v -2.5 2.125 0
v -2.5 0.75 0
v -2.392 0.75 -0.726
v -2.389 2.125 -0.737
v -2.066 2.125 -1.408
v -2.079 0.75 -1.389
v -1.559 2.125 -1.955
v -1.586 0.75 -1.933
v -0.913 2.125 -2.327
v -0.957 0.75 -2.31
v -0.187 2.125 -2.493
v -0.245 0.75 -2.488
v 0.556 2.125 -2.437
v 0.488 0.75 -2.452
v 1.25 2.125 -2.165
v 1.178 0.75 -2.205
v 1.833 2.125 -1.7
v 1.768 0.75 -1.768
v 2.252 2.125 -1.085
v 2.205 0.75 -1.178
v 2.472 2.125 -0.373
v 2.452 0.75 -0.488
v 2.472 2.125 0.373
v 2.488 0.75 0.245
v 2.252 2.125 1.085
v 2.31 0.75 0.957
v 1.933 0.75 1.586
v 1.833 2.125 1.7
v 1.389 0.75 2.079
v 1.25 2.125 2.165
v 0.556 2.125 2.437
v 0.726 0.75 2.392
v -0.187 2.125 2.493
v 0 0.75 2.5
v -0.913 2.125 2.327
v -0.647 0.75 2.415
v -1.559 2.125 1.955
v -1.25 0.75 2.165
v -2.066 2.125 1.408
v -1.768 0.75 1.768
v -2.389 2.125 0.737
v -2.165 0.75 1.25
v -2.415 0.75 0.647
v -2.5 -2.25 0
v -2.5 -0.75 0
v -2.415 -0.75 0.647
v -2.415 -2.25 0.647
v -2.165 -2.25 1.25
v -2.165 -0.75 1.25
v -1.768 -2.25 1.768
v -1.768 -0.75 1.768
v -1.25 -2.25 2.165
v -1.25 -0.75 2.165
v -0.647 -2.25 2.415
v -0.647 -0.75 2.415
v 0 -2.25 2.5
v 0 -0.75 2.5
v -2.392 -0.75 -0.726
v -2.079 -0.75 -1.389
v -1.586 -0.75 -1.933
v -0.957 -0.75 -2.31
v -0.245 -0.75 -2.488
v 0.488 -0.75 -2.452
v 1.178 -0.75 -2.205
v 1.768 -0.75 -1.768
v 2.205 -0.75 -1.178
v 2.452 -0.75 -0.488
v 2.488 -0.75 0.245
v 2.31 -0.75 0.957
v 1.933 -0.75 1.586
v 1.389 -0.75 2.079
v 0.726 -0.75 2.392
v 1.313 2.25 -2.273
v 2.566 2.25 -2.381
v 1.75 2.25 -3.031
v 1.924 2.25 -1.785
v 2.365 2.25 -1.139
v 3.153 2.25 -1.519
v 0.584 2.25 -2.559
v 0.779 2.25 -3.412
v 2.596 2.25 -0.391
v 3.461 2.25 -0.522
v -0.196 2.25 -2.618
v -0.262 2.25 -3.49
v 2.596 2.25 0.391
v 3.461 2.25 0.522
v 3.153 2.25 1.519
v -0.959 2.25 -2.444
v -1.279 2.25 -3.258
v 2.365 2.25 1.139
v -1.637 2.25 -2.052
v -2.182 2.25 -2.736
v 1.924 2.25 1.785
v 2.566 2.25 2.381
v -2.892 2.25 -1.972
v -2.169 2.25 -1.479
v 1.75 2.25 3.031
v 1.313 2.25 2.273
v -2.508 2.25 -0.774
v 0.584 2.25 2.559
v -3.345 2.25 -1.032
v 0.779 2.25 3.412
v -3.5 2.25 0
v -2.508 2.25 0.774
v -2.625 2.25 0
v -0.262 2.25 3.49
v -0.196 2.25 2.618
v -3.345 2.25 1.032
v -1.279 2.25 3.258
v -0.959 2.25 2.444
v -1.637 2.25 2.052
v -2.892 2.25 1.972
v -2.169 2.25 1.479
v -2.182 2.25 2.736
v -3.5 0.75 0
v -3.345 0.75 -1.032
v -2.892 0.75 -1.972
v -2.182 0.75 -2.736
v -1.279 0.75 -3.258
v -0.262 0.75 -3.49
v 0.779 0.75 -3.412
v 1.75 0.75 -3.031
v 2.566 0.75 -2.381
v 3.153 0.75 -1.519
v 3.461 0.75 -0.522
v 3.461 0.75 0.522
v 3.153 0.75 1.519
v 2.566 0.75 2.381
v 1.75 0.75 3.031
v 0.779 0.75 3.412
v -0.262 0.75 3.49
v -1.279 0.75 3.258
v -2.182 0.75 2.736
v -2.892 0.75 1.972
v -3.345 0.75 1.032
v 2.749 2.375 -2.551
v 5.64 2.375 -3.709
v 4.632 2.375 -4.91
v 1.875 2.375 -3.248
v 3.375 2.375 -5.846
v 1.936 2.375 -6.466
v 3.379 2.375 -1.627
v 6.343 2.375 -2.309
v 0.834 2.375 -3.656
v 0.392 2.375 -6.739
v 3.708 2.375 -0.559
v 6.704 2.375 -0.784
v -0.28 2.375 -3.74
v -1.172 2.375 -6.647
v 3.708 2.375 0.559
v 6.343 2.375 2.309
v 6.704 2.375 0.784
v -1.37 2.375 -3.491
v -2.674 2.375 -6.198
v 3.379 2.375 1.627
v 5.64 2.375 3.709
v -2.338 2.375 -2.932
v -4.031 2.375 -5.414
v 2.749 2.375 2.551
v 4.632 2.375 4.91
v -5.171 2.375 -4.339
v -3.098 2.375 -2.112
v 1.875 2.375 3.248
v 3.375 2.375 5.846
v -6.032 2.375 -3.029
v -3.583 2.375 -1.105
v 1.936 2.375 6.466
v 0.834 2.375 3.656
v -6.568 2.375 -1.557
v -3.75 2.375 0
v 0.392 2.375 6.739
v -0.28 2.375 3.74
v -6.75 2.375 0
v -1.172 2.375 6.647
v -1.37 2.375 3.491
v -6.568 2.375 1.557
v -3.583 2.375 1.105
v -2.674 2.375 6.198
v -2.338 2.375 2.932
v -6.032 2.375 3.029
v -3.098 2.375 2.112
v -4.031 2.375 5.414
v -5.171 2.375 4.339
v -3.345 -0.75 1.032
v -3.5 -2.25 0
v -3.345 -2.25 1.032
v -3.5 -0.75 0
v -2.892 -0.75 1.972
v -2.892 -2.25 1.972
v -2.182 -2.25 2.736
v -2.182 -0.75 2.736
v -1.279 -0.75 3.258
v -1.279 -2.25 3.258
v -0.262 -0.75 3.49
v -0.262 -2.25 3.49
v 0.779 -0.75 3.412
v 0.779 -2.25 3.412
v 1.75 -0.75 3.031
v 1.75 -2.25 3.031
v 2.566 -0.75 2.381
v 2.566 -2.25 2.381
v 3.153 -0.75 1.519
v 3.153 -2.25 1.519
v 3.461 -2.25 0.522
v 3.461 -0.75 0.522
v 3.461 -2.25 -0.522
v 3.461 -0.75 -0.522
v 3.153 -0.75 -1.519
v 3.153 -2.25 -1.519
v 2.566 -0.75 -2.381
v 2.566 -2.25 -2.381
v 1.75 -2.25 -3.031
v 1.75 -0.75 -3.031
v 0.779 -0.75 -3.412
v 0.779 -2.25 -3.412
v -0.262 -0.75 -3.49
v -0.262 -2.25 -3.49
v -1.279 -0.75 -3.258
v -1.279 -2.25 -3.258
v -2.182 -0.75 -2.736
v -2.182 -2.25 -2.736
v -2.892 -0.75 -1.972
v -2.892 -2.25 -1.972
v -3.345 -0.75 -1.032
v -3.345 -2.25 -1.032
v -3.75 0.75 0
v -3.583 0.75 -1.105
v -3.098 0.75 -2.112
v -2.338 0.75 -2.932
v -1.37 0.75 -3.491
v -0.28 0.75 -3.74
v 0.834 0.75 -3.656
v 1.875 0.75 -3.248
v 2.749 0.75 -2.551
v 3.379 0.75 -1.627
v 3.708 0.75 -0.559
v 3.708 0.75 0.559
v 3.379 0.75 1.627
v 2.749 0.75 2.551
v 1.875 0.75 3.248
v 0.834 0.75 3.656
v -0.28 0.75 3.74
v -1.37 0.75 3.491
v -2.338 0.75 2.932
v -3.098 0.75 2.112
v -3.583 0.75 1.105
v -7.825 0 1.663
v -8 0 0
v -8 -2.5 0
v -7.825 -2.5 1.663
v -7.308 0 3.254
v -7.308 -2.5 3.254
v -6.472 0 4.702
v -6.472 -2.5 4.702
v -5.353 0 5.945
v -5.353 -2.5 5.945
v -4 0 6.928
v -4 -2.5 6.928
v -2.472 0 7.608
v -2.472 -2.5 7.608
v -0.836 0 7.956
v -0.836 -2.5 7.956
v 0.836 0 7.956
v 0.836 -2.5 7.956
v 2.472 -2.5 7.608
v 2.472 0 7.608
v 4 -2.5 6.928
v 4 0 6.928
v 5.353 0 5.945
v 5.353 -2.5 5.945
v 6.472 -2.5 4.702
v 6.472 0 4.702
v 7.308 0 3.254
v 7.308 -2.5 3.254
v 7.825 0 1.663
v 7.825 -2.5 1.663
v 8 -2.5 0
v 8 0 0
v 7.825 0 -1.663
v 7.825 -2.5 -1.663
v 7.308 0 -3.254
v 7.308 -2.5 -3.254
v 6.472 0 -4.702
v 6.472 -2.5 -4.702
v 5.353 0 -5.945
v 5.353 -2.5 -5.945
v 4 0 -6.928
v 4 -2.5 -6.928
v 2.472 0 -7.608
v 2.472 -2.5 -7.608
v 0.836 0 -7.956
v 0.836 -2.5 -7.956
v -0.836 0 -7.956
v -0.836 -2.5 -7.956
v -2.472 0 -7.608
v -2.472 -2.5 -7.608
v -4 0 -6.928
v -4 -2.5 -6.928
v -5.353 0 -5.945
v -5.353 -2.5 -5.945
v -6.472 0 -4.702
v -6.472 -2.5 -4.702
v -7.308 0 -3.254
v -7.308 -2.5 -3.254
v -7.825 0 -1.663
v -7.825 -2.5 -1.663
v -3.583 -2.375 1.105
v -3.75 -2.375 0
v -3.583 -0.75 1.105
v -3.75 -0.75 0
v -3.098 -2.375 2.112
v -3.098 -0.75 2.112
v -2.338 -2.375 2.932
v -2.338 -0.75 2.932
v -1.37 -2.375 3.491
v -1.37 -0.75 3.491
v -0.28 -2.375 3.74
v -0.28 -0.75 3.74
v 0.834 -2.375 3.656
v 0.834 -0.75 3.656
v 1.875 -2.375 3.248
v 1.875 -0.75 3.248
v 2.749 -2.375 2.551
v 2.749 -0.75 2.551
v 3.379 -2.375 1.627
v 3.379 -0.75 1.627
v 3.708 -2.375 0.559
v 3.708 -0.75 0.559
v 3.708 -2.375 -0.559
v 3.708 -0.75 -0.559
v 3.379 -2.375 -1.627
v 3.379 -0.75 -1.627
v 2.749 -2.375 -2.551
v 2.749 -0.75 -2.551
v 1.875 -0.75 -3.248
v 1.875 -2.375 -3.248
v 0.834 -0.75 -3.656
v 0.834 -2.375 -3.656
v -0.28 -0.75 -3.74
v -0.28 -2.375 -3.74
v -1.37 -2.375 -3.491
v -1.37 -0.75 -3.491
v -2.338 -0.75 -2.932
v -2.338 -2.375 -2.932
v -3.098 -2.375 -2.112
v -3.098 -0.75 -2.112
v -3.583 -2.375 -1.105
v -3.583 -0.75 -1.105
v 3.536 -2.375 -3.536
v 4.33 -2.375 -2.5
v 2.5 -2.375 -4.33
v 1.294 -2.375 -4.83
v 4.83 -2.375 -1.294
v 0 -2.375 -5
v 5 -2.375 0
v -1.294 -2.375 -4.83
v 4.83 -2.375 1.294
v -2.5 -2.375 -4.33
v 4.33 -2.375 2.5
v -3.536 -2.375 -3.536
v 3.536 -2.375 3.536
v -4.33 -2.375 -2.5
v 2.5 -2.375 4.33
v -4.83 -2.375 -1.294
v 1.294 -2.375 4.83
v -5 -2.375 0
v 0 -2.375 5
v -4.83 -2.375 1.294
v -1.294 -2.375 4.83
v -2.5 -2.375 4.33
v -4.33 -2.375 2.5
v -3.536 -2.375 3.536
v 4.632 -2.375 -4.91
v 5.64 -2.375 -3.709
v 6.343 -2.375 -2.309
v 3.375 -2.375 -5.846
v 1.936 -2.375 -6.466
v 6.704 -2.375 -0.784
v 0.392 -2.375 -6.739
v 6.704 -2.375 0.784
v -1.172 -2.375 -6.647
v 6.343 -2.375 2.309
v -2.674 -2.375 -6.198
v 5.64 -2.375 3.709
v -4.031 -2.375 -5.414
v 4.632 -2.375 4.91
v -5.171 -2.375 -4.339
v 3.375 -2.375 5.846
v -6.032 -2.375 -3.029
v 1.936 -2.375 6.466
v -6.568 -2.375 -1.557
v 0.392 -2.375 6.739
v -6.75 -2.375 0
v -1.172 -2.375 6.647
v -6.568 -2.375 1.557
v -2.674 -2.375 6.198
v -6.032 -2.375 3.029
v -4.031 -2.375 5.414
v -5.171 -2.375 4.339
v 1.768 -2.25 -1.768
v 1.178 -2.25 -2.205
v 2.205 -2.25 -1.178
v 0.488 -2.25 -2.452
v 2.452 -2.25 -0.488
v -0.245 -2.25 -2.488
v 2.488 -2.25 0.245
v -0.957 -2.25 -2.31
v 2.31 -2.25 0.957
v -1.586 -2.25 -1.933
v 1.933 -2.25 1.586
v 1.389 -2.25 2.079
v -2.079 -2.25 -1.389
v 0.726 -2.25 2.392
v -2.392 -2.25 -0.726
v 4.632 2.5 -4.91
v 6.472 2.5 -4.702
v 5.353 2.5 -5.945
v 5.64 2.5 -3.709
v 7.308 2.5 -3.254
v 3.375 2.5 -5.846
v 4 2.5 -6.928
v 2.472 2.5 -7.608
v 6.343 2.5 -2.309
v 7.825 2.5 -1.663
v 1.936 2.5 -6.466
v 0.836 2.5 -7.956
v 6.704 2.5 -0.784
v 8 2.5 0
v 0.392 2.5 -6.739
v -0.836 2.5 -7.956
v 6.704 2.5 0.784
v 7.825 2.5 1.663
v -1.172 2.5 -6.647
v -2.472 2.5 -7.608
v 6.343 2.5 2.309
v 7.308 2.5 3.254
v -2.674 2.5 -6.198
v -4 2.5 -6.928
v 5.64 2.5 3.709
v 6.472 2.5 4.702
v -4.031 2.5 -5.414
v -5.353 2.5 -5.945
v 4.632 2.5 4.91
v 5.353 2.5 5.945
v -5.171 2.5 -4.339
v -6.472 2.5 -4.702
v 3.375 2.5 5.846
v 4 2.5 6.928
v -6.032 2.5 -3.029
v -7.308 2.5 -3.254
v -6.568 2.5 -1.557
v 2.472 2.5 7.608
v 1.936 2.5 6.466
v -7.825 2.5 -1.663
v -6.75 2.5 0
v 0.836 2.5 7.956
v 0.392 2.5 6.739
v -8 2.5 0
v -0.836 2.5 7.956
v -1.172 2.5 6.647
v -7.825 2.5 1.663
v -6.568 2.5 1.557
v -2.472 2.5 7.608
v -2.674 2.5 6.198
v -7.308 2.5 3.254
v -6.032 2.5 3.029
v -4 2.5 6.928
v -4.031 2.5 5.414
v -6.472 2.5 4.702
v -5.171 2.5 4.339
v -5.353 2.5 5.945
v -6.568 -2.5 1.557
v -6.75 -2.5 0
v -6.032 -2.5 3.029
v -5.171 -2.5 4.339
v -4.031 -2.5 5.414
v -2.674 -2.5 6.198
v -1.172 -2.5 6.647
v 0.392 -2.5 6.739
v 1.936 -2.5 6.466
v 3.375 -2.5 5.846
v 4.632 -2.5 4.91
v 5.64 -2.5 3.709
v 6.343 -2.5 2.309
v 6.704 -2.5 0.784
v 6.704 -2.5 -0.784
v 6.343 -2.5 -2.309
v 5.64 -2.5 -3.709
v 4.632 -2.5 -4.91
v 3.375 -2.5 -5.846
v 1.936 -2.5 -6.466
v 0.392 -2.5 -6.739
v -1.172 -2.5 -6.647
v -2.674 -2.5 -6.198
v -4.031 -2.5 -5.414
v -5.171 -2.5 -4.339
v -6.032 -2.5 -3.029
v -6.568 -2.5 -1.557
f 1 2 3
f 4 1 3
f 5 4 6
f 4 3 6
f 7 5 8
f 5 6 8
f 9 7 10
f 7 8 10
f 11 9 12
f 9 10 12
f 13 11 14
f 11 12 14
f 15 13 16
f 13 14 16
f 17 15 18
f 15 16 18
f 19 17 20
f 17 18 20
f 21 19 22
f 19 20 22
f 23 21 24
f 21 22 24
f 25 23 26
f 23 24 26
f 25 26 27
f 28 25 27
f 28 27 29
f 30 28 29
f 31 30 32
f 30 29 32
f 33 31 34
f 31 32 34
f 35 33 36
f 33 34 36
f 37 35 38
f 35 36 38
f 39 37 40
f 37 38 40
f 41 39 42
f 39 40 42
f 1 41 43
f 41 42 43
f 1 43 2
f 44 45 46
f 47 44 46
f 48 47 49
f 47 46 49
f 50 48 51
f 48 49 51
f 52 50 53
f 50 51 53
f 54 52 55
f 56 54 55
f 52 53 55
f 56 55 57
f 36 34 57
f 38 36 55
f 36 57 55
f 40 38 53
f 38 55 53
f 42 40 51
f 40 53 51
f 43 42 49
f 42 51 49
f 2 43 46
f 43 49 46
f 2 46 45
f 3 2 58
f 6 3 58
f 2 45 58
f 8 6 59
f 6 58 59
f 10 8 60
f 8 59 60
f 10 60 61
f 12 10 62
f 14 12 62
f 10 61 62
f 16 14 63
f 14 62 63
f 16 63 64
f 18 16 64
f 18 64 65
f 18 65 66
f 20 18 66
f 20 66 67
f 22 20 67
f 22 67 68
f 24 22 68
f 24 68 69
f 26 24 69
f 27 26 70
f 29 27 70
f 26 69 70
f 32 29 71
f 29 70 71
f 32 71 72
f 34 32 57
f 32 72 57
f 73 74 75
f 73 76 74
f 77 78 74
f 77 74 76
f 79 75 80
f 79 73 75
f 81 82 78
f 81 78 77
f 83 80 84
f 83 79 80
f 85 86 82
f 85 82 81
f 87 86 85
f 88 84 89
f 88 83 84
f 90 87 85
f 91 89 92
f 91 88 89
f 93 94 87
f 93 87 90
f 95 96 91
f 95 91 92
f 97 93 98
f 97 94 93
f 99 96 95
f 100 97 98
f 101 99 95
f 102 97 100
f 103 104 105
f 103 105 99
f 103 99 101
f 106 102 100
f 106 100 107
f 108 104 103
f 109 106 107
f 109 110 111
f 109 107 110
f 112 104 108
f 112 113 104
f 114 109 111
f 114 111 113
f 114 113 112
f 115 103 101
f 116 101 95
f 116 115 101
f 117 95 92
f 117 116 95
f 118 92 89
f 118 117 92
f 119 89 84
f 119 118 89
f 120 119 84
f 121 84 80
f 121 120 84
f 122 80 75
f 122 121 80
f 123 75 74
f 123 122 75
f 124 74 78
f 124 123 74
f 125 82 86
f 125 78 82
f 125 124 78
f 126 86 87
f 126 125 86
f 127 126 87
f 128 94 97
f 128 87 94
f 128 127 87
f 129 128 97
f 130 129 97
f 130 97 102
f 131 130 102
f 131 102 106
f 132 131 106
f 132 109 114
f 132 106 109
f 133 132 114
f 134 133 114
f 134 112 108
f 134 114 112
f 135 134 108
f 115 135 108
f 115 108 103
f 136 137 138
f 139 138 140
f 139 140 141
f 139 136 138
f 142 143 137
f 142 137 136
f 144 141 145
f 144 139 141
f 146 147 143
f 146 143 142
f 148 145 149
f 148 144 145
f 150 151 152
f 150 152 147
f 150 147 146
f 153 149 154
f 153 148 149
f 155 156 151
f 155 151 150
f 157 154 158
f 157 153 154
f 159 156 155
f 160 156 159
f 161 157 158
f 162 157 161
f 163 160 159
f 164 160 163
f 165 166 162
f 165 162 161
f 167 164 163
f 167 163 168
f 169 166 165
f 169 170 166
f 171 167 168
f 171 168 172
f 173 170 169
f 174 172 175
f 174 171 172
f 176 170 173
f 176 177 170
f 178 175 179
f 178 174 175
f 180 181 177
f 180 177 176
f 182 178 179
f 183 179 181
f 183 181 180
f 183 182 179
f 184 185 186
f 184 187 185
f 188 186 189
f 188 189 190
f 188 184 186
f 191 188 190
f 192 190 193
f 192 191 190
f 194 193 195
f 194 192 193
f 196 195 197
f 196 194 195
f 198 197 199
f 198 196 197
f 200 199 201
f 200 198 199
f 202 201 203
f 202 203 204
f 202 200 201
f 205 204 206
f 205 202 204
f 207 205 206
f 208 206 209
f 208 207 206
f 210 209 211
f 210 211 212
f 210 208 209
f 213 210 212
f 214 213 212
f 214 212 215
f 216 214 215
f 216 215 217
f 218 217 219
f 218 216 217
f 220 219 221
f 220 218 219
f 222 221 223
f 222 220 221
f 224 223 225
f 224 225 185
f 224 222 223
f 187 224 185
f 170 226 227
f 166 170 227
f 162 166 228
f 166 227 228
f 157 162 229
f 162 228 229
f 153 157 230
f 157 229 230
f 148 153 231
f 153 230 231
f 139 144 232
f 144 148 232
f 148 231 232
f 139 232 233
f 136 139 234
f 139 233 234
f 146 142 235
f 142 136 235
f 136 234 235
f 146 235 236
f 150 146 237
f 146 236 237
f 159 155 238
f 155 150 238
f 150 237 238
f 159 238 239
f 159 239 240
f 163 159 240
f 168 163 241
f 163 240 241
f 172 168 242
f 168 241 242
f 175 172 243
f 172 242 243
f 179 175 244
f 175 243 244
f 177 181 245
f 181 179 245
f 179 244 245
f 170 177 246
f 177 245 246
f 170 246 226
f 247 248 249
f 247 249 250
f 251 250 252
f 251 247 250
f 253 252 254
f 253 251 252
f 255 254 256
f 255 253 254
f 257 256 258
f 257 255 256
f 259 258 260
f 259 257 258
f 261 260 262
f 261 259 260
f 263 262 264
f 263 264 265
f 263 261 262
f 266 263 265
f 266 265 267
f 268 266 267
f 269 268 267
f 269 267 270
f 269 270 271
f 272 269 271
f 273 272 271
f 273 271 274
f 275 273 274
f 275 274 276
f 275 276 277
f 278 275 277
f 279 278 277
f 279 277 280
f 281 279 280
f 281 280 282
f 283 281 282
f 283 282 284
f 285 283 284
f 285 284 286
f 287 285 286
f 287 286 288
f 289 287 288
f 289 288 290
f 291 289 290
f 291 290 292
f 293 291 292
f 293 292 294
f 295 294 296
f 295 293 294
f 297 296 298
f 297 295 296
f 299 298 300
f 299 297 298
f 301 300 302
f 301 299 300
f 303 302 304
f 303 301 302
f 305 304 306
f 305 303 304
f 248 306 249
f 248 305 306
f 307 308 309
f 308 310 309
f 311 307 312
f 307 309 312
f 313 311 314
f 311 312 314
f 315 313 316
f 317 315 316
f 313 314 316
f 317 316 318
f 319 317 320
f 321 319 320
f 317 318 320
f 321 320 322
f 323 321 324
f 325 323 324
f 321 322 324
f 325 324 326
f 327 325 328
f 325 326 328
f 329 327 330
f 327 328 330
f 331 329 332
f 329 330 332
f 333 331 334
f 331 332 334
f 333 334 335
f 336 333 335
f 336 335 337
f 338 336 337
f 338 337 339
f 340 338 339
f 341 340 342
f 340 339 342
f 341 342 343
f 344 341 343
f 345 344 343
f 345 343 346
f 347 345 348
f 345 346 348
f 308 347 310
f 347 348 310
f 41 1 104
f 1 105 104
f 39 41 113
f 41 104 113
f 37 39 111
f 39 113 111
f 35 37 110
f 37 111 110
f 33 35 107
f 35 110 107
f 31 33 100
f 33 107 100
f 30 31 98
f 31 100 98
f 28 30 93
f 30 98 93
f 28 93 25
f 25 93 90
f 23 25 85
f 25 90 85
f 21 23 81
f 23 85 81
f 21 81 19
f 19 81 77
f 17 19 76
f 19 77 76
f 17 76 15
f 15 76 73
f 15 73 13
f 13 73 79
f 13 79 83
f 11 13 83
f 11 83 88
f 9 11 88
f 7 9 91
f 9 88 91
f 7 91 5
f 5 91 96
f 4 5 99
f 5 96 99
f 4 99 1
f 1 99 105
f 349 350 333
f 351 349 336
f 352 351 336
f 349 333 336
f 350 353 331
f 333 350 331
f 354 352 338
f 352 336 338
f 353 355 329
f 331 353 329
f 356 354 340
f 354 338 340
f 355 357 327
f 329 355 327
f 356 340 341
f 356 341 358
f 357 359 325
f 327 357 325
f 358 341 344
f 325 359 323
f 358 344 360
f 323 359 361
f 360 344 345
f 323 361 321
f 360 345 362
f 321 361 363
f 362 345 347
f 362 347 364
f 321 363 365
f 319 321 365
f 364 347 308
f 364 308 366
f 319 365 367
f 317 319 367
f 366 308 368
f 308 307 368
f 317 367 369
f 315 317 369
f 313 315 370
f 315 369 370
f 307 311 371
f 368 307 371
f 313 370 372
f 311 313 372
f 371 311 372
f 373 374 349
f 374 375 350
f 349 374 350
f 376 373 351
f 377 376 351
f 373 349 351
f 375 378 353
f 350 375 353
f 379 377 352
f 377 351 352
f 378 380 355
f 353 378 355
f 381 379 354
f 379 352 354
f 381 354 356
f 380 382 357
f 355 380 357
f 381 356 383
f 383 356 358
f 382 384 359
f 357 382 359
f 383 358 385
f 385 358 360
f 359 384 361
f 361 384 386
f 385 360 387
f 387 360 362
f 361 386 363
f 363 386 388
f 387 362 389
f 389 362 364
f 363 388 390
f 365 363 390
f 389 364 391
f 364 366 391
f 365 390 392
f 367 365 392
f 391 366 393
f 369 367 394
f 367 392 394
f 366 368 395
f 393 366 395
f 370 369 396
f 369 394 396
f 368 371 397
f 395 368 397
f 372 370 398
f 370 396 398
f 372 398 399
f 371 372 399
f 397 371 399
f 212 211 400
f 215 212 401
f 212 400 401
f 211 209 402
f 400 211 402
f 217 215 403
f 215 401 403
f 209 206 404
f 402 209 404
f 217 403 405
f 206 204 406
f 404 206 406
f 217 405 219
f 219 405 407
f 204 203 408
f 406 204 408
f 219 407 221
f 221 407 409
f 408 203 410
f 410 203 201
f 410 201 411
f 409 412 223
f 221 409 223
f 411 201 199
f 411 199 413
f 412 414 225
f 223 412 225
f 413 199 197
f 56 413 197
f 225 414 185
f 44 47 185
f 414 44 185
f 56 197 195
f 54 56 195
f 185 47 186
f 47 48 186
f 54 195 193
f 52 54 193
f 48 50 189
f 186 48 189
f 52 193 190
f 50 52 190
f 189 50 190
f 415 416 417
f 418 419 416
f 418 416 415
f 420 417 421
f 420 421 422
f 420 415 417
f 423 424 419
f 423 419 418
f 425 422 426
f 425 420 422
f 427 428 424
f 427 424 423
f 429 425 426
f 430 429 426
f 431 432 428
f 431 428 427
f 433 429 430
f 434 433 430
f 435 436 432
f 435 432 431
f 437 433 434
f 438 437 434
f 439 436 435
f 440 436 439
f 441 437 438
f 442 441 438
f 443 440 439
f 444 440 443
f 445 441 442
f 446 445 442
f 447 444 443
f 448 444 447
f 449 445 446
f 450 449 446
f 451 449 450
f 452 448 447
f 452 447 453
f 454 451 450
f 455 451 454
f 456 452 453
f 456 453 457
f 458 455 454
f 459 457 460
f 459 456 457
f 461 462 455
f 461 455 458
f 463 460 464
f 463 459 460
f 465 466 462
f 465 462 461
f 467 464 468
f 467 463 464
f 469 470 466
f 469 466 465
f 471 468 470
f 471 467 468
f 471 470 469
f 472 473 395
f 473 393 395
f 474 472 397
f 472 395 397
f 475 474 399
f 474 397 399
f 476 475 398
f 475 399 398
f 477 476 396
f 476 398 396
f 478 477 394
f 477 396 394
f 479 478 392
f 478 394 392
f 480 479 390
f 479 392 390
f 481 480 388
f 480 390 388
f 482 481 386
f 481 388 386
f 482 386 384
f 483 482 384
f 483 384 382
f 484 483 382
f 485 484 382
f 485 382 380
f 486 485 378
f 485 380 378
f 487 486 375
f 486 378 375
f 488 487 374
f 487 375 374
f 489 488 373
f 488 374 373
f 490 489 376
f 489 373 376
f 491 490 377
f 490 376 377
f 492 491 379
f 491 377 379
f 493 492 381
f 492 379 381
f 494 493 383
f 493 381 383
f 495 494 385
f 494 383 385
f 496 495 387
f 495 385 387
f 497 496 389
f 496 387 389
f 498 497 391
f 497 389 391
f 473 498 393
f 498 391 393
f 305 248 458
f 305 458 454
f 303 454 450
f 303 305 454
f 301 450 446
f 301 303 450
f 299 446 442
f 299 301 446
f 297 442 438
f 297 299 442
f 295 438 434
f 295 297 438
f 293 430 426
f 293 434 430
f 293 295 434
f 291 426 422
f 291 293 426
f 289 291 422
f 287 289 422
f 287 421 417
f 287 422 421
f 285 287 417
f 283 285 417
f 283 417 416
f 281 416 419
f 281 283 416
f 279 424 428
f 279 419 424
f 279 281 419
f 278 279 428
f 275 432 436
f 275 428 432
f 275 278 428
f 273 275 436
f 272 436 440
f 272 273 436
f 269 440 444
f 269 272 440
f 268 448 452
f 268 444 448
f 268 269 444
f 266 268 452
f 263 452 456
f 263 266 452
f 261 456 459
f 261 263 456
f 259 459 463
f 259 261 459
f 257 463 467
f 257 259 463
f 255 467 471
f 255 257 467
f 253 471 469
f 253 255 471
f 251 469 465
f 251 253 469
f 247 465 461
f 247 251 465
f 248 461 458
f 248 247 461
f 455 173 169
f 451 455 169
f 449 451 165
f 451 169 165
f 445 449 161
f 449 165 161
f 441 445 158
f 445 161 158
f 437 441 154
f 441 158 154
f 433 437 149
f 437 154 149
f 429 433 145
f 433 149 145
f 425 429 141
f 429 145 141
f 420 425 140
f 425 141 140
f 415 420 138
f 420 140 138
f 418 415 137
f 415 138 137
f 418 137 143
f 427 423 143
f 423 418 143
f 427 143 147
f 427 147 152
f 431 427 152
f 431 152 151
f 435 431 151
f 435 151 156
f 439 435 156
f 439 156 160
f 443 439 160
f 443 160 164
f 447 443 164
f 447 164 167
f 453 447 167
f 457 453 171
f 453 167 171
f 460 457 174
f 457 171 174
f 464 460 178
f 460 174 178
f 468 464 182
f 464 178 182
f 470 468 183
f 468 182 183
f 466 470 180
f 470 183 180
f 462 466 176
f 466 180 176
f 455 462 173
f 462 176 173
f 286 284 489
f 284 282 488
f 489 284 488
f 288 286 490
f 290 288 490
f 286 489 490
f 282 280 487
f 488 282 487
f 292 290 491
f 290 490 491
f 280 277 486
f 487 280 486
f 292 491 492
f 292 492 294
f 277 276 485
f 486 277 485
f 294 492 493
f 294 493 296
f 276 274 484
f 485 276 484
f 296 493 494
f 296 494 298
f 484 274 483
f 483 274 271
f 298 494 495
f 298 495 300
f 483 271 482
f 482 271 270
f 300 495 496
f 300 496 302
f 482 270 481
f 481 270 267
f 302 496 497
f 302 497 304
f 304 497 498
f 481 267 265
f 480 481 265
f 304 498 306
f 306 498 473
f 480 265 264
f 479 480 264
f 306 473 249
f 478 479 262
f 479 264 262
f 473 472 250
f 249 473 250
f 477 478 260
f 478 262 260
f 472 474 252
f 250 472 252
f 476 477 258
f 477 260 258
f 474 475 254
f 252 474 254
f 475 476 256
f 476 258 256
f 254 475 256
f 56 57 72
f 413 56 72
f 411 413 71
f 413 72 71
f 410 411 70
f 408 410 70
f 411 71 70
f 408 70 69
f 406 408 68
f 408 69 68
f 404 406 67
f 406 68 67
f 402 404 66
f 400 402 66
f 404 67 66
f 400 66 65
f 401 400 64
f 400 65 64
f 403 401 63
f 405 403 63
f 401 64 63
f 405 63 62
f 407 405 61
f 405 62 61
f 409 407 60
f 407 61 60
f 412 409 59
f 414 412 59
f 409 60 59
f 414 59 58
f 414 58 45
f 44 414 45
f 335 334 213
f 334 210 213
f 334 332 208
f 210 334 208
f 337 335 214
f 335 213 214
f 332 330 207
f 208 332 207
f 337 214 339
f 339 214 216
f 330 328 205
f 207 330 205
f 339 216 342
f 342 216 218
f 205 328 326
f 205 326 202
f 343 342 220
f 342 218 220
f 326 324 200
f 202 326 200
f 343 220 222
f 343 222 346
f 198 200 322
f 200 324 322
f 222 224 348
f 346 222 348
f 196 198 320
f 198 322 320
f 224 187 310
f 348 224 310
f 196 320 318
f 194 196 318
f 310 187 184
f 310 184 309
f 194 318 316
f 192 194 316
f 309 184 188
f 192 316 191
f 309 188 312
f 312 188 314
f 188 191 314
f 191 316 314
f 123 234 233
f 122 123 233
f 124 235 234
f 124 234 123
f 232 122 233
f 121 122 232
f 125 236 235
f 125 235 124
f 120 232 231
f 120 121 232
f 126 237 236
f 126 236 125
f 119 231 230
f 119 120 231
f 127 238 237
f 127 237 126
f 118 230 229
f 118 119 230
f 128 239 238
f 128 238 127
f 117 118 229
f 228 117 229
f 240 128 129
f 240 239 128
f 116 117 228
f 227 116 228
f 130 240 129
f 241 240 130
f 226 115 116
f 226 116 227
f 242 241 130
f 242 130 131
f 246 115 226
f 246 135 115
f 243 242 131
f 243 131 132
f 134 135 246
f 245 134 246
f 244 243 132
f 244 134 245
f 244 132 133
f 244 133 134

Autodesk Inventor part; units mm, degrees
ref_plane "YZ Plane" through (0, 0, 0) normal (1, 0, 0) x (0, 1, 0)
ref_plane "XZ Plane" through (0, 0, 0) normal (0, 1, 0) x (-1, 0, 0)
ref_plane "XY Plane" through (0, 0, 0) normal (0, 0, 1) x (1, 0, 0)
sketch "Szkic1" plane through (0, 0, 0) normal (0, 1, 0) x (-1, 0, 0)
  circle A0 centre (0, 0) radius 2.5
  circle A1 centre (0, 0) radius 8
  circle A2 centre (0, 0) radius 3.5
  circle A3 centre (0, 0) radius 3.5
  circle A4 centre (0, 0) radius 6.75
  circle A5 centre (0, 0) radius 5
  circle A6 centre (0, 0) radius 3.75
  dimension "d0" = 5
  dimension "d1" = 16
  dimension "d2" = 7
  dimension "d3" = 7
  dimension "d4" = 13.5
  dimension "d13" = 10
  dimension "d16" = 7.5
extrude "Wyciągnięcie proste7" add sketch "Szkic1" along normal mid plane 4.5 contours A2
extrude "Wyciągnięcie proste8" add sketch "Szkic1" along normal mid plane 4.75 contours A5
extrude "Wyciągnięcie proste9" add sketch "Szkic1" along normal mid plane 1.5 contours A0 | A2 | A6
extrude "Wyciągnięcie proste10" add sketch "Szkic1" along normal mid plane 5 contours A1
extrude "Wyciągnięcie proste11" add sketch "Szkic1" along normal mid plane 4.75 contours A4
sketch "Szkic2" plane through (0, 0.75, 0) normal (0, 1, 0) x (1, 0, 0)
  point P0 (0, 0)
  point P1 (0.0085, 0.051)
hole "Otwór3" at (0, 0.75, 0) direction (0, -1, 0) diameter 5 end through all
chamfer "Faza3" distance 0.125 angle 45 1 edges at (2.5, 2.25, 0)
properties part number "lozysko"
